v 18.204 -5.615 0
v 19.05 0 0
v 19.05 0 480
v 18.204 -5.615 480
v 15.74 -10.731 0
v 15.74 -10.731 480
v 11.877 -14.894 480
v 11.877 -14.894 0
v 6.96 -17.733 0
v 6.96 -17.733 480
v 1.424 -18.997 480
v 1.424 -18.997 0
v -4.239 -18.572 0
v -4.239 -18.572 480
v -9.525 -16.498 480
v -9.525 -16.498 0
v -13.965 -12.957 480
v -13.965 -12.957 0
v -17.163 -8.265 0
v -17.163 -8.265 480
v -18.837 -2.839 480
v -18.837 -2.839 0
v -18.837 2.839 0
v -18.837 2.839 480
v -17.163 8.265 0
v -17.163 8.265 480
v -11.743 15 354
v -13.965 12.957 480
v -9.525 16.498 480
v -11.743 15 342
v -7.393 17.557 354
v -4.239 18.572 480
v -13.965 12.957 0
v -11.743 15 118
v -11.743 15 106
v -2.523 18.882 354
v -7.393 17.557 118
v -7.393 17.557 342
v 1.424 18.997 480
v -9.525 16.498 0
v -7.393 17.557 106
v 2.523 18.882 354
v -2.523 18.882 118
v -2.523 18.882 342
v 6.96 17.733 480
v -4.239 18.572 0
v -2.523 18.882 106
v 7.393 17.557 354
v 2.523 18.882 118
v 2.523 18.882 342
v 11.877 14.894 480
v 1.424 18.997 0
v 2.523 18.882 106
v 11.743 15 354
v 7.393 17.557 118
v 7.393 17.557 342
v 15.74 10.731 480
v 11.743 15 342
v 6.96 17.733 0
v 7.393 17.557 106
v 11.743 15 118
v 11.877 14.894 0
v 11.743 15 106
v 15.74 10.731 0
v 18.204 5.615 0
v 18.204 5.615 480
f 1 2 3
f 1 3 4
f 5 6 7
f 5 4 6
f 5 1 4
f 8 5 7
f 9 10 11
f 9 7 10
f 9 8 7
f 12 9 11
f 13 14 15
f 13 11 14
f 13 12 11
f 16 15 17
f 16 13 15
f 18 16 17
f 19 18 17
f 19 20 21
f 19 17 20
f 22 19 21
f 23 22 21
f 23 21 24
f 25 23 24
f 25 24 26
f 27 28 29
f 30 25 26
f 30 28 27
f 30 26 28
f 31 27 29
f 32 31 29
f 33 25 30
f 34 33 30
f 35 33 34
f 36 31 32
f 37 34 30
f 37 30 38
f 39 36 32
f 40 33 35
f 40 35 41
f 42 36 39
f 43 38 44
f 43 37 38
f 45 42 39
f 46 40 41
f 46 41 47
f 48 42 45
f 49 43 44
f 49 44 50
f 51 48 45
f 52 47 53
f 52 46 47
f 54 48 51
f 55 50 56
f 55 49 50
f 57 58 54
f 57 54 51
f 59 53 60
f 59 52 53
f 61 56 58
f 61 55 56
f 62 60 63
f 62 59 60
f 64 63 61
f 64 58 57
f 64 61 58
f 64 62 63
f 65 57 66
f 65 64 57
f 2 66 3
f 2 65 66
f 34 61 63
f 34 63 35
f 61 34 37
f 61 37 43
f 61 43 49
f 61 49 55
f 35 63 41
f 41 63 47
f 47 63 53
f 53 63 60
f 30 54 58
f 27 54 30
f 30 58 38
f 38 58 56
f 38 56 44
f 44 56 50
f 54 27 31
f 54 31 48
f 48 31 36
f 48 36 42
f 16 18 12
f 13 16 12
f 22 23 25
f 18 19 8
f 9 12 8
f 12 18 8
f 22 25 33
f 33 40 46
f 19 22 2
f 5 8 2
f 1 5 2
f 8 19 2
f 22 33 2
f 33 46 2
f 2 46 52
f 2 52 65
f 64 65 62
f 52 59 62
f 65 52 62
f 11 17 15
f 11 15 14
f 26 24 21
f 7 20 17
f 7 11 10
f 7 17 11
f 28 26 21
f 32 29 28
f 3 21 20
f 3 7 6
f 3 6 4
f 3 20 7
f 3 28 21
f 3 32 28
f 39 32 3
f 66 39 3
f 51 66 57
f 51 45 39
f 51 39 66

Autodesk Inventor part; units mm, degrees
ref_plane "YZ Plane" through (0, 0, 0) normal (1, 0, 0) x (0, 1, 0)
ref_plane "XY Plane" through (0, 0, 0) normal (0, 0, 1) x (1, 0, 0)
sketch "Sketch1" plane through (0, 0, 0) normal (0, 0, 1) x (1, 0, 0)
  circle A0 centre (0, 0) radius 19.05
  dimension "d0" = 38.1
extrude "Extrusion1" add sketch "Sketch1" along normal blind 480
ref_plane "Work Plane1" through (0, 15, 0) normal (0, 1, 0) x (-1, 0, 0)
sketch "Sketch2" plane through (0, 15, 0) normal (0, 1, 0) x (-1, 0, 0)
  line L0 (-122.6999, 230) -> (112.1399, 230) construction
  line L1 (-19.05, 0) -> (19.05, 0) projected
  line L2 (-122.6999, 128) -> (109.8048, 128) construction
  line L3 (-29.6313, 106) -> (33.0816, 106)
  line L4 (33.0816, 106) -> (33.0816, 118)
  line L5 (33.0816, 118) -> (-29.6313, 118)
  line L6 (-29.6313, 118) -> (-29.6313, 106)
  line L7 (-41.3065, 342) -> (43.7561, 342)
  line L8 (43.7561, 342) -> (43.7561, 354)
  line L9 (43.7561, 354) -> (-41.3065, 354)
  line L10 (-41.3065, 354) -> (-41.3065, 342)
  point P0 (0, 0)
  dimension "d5" = 230
  dimension "d6" = 102
  dimension "d8" = 12
  dimension "d9" = 12
  dimension "d11" = 112
  dimension "d14" = 112
extrude "Extrusion2" cut sketch "Sketch2" along normal through all
properties part number "1231_Spool Shaft_V1" material "Iron, Ductile"
